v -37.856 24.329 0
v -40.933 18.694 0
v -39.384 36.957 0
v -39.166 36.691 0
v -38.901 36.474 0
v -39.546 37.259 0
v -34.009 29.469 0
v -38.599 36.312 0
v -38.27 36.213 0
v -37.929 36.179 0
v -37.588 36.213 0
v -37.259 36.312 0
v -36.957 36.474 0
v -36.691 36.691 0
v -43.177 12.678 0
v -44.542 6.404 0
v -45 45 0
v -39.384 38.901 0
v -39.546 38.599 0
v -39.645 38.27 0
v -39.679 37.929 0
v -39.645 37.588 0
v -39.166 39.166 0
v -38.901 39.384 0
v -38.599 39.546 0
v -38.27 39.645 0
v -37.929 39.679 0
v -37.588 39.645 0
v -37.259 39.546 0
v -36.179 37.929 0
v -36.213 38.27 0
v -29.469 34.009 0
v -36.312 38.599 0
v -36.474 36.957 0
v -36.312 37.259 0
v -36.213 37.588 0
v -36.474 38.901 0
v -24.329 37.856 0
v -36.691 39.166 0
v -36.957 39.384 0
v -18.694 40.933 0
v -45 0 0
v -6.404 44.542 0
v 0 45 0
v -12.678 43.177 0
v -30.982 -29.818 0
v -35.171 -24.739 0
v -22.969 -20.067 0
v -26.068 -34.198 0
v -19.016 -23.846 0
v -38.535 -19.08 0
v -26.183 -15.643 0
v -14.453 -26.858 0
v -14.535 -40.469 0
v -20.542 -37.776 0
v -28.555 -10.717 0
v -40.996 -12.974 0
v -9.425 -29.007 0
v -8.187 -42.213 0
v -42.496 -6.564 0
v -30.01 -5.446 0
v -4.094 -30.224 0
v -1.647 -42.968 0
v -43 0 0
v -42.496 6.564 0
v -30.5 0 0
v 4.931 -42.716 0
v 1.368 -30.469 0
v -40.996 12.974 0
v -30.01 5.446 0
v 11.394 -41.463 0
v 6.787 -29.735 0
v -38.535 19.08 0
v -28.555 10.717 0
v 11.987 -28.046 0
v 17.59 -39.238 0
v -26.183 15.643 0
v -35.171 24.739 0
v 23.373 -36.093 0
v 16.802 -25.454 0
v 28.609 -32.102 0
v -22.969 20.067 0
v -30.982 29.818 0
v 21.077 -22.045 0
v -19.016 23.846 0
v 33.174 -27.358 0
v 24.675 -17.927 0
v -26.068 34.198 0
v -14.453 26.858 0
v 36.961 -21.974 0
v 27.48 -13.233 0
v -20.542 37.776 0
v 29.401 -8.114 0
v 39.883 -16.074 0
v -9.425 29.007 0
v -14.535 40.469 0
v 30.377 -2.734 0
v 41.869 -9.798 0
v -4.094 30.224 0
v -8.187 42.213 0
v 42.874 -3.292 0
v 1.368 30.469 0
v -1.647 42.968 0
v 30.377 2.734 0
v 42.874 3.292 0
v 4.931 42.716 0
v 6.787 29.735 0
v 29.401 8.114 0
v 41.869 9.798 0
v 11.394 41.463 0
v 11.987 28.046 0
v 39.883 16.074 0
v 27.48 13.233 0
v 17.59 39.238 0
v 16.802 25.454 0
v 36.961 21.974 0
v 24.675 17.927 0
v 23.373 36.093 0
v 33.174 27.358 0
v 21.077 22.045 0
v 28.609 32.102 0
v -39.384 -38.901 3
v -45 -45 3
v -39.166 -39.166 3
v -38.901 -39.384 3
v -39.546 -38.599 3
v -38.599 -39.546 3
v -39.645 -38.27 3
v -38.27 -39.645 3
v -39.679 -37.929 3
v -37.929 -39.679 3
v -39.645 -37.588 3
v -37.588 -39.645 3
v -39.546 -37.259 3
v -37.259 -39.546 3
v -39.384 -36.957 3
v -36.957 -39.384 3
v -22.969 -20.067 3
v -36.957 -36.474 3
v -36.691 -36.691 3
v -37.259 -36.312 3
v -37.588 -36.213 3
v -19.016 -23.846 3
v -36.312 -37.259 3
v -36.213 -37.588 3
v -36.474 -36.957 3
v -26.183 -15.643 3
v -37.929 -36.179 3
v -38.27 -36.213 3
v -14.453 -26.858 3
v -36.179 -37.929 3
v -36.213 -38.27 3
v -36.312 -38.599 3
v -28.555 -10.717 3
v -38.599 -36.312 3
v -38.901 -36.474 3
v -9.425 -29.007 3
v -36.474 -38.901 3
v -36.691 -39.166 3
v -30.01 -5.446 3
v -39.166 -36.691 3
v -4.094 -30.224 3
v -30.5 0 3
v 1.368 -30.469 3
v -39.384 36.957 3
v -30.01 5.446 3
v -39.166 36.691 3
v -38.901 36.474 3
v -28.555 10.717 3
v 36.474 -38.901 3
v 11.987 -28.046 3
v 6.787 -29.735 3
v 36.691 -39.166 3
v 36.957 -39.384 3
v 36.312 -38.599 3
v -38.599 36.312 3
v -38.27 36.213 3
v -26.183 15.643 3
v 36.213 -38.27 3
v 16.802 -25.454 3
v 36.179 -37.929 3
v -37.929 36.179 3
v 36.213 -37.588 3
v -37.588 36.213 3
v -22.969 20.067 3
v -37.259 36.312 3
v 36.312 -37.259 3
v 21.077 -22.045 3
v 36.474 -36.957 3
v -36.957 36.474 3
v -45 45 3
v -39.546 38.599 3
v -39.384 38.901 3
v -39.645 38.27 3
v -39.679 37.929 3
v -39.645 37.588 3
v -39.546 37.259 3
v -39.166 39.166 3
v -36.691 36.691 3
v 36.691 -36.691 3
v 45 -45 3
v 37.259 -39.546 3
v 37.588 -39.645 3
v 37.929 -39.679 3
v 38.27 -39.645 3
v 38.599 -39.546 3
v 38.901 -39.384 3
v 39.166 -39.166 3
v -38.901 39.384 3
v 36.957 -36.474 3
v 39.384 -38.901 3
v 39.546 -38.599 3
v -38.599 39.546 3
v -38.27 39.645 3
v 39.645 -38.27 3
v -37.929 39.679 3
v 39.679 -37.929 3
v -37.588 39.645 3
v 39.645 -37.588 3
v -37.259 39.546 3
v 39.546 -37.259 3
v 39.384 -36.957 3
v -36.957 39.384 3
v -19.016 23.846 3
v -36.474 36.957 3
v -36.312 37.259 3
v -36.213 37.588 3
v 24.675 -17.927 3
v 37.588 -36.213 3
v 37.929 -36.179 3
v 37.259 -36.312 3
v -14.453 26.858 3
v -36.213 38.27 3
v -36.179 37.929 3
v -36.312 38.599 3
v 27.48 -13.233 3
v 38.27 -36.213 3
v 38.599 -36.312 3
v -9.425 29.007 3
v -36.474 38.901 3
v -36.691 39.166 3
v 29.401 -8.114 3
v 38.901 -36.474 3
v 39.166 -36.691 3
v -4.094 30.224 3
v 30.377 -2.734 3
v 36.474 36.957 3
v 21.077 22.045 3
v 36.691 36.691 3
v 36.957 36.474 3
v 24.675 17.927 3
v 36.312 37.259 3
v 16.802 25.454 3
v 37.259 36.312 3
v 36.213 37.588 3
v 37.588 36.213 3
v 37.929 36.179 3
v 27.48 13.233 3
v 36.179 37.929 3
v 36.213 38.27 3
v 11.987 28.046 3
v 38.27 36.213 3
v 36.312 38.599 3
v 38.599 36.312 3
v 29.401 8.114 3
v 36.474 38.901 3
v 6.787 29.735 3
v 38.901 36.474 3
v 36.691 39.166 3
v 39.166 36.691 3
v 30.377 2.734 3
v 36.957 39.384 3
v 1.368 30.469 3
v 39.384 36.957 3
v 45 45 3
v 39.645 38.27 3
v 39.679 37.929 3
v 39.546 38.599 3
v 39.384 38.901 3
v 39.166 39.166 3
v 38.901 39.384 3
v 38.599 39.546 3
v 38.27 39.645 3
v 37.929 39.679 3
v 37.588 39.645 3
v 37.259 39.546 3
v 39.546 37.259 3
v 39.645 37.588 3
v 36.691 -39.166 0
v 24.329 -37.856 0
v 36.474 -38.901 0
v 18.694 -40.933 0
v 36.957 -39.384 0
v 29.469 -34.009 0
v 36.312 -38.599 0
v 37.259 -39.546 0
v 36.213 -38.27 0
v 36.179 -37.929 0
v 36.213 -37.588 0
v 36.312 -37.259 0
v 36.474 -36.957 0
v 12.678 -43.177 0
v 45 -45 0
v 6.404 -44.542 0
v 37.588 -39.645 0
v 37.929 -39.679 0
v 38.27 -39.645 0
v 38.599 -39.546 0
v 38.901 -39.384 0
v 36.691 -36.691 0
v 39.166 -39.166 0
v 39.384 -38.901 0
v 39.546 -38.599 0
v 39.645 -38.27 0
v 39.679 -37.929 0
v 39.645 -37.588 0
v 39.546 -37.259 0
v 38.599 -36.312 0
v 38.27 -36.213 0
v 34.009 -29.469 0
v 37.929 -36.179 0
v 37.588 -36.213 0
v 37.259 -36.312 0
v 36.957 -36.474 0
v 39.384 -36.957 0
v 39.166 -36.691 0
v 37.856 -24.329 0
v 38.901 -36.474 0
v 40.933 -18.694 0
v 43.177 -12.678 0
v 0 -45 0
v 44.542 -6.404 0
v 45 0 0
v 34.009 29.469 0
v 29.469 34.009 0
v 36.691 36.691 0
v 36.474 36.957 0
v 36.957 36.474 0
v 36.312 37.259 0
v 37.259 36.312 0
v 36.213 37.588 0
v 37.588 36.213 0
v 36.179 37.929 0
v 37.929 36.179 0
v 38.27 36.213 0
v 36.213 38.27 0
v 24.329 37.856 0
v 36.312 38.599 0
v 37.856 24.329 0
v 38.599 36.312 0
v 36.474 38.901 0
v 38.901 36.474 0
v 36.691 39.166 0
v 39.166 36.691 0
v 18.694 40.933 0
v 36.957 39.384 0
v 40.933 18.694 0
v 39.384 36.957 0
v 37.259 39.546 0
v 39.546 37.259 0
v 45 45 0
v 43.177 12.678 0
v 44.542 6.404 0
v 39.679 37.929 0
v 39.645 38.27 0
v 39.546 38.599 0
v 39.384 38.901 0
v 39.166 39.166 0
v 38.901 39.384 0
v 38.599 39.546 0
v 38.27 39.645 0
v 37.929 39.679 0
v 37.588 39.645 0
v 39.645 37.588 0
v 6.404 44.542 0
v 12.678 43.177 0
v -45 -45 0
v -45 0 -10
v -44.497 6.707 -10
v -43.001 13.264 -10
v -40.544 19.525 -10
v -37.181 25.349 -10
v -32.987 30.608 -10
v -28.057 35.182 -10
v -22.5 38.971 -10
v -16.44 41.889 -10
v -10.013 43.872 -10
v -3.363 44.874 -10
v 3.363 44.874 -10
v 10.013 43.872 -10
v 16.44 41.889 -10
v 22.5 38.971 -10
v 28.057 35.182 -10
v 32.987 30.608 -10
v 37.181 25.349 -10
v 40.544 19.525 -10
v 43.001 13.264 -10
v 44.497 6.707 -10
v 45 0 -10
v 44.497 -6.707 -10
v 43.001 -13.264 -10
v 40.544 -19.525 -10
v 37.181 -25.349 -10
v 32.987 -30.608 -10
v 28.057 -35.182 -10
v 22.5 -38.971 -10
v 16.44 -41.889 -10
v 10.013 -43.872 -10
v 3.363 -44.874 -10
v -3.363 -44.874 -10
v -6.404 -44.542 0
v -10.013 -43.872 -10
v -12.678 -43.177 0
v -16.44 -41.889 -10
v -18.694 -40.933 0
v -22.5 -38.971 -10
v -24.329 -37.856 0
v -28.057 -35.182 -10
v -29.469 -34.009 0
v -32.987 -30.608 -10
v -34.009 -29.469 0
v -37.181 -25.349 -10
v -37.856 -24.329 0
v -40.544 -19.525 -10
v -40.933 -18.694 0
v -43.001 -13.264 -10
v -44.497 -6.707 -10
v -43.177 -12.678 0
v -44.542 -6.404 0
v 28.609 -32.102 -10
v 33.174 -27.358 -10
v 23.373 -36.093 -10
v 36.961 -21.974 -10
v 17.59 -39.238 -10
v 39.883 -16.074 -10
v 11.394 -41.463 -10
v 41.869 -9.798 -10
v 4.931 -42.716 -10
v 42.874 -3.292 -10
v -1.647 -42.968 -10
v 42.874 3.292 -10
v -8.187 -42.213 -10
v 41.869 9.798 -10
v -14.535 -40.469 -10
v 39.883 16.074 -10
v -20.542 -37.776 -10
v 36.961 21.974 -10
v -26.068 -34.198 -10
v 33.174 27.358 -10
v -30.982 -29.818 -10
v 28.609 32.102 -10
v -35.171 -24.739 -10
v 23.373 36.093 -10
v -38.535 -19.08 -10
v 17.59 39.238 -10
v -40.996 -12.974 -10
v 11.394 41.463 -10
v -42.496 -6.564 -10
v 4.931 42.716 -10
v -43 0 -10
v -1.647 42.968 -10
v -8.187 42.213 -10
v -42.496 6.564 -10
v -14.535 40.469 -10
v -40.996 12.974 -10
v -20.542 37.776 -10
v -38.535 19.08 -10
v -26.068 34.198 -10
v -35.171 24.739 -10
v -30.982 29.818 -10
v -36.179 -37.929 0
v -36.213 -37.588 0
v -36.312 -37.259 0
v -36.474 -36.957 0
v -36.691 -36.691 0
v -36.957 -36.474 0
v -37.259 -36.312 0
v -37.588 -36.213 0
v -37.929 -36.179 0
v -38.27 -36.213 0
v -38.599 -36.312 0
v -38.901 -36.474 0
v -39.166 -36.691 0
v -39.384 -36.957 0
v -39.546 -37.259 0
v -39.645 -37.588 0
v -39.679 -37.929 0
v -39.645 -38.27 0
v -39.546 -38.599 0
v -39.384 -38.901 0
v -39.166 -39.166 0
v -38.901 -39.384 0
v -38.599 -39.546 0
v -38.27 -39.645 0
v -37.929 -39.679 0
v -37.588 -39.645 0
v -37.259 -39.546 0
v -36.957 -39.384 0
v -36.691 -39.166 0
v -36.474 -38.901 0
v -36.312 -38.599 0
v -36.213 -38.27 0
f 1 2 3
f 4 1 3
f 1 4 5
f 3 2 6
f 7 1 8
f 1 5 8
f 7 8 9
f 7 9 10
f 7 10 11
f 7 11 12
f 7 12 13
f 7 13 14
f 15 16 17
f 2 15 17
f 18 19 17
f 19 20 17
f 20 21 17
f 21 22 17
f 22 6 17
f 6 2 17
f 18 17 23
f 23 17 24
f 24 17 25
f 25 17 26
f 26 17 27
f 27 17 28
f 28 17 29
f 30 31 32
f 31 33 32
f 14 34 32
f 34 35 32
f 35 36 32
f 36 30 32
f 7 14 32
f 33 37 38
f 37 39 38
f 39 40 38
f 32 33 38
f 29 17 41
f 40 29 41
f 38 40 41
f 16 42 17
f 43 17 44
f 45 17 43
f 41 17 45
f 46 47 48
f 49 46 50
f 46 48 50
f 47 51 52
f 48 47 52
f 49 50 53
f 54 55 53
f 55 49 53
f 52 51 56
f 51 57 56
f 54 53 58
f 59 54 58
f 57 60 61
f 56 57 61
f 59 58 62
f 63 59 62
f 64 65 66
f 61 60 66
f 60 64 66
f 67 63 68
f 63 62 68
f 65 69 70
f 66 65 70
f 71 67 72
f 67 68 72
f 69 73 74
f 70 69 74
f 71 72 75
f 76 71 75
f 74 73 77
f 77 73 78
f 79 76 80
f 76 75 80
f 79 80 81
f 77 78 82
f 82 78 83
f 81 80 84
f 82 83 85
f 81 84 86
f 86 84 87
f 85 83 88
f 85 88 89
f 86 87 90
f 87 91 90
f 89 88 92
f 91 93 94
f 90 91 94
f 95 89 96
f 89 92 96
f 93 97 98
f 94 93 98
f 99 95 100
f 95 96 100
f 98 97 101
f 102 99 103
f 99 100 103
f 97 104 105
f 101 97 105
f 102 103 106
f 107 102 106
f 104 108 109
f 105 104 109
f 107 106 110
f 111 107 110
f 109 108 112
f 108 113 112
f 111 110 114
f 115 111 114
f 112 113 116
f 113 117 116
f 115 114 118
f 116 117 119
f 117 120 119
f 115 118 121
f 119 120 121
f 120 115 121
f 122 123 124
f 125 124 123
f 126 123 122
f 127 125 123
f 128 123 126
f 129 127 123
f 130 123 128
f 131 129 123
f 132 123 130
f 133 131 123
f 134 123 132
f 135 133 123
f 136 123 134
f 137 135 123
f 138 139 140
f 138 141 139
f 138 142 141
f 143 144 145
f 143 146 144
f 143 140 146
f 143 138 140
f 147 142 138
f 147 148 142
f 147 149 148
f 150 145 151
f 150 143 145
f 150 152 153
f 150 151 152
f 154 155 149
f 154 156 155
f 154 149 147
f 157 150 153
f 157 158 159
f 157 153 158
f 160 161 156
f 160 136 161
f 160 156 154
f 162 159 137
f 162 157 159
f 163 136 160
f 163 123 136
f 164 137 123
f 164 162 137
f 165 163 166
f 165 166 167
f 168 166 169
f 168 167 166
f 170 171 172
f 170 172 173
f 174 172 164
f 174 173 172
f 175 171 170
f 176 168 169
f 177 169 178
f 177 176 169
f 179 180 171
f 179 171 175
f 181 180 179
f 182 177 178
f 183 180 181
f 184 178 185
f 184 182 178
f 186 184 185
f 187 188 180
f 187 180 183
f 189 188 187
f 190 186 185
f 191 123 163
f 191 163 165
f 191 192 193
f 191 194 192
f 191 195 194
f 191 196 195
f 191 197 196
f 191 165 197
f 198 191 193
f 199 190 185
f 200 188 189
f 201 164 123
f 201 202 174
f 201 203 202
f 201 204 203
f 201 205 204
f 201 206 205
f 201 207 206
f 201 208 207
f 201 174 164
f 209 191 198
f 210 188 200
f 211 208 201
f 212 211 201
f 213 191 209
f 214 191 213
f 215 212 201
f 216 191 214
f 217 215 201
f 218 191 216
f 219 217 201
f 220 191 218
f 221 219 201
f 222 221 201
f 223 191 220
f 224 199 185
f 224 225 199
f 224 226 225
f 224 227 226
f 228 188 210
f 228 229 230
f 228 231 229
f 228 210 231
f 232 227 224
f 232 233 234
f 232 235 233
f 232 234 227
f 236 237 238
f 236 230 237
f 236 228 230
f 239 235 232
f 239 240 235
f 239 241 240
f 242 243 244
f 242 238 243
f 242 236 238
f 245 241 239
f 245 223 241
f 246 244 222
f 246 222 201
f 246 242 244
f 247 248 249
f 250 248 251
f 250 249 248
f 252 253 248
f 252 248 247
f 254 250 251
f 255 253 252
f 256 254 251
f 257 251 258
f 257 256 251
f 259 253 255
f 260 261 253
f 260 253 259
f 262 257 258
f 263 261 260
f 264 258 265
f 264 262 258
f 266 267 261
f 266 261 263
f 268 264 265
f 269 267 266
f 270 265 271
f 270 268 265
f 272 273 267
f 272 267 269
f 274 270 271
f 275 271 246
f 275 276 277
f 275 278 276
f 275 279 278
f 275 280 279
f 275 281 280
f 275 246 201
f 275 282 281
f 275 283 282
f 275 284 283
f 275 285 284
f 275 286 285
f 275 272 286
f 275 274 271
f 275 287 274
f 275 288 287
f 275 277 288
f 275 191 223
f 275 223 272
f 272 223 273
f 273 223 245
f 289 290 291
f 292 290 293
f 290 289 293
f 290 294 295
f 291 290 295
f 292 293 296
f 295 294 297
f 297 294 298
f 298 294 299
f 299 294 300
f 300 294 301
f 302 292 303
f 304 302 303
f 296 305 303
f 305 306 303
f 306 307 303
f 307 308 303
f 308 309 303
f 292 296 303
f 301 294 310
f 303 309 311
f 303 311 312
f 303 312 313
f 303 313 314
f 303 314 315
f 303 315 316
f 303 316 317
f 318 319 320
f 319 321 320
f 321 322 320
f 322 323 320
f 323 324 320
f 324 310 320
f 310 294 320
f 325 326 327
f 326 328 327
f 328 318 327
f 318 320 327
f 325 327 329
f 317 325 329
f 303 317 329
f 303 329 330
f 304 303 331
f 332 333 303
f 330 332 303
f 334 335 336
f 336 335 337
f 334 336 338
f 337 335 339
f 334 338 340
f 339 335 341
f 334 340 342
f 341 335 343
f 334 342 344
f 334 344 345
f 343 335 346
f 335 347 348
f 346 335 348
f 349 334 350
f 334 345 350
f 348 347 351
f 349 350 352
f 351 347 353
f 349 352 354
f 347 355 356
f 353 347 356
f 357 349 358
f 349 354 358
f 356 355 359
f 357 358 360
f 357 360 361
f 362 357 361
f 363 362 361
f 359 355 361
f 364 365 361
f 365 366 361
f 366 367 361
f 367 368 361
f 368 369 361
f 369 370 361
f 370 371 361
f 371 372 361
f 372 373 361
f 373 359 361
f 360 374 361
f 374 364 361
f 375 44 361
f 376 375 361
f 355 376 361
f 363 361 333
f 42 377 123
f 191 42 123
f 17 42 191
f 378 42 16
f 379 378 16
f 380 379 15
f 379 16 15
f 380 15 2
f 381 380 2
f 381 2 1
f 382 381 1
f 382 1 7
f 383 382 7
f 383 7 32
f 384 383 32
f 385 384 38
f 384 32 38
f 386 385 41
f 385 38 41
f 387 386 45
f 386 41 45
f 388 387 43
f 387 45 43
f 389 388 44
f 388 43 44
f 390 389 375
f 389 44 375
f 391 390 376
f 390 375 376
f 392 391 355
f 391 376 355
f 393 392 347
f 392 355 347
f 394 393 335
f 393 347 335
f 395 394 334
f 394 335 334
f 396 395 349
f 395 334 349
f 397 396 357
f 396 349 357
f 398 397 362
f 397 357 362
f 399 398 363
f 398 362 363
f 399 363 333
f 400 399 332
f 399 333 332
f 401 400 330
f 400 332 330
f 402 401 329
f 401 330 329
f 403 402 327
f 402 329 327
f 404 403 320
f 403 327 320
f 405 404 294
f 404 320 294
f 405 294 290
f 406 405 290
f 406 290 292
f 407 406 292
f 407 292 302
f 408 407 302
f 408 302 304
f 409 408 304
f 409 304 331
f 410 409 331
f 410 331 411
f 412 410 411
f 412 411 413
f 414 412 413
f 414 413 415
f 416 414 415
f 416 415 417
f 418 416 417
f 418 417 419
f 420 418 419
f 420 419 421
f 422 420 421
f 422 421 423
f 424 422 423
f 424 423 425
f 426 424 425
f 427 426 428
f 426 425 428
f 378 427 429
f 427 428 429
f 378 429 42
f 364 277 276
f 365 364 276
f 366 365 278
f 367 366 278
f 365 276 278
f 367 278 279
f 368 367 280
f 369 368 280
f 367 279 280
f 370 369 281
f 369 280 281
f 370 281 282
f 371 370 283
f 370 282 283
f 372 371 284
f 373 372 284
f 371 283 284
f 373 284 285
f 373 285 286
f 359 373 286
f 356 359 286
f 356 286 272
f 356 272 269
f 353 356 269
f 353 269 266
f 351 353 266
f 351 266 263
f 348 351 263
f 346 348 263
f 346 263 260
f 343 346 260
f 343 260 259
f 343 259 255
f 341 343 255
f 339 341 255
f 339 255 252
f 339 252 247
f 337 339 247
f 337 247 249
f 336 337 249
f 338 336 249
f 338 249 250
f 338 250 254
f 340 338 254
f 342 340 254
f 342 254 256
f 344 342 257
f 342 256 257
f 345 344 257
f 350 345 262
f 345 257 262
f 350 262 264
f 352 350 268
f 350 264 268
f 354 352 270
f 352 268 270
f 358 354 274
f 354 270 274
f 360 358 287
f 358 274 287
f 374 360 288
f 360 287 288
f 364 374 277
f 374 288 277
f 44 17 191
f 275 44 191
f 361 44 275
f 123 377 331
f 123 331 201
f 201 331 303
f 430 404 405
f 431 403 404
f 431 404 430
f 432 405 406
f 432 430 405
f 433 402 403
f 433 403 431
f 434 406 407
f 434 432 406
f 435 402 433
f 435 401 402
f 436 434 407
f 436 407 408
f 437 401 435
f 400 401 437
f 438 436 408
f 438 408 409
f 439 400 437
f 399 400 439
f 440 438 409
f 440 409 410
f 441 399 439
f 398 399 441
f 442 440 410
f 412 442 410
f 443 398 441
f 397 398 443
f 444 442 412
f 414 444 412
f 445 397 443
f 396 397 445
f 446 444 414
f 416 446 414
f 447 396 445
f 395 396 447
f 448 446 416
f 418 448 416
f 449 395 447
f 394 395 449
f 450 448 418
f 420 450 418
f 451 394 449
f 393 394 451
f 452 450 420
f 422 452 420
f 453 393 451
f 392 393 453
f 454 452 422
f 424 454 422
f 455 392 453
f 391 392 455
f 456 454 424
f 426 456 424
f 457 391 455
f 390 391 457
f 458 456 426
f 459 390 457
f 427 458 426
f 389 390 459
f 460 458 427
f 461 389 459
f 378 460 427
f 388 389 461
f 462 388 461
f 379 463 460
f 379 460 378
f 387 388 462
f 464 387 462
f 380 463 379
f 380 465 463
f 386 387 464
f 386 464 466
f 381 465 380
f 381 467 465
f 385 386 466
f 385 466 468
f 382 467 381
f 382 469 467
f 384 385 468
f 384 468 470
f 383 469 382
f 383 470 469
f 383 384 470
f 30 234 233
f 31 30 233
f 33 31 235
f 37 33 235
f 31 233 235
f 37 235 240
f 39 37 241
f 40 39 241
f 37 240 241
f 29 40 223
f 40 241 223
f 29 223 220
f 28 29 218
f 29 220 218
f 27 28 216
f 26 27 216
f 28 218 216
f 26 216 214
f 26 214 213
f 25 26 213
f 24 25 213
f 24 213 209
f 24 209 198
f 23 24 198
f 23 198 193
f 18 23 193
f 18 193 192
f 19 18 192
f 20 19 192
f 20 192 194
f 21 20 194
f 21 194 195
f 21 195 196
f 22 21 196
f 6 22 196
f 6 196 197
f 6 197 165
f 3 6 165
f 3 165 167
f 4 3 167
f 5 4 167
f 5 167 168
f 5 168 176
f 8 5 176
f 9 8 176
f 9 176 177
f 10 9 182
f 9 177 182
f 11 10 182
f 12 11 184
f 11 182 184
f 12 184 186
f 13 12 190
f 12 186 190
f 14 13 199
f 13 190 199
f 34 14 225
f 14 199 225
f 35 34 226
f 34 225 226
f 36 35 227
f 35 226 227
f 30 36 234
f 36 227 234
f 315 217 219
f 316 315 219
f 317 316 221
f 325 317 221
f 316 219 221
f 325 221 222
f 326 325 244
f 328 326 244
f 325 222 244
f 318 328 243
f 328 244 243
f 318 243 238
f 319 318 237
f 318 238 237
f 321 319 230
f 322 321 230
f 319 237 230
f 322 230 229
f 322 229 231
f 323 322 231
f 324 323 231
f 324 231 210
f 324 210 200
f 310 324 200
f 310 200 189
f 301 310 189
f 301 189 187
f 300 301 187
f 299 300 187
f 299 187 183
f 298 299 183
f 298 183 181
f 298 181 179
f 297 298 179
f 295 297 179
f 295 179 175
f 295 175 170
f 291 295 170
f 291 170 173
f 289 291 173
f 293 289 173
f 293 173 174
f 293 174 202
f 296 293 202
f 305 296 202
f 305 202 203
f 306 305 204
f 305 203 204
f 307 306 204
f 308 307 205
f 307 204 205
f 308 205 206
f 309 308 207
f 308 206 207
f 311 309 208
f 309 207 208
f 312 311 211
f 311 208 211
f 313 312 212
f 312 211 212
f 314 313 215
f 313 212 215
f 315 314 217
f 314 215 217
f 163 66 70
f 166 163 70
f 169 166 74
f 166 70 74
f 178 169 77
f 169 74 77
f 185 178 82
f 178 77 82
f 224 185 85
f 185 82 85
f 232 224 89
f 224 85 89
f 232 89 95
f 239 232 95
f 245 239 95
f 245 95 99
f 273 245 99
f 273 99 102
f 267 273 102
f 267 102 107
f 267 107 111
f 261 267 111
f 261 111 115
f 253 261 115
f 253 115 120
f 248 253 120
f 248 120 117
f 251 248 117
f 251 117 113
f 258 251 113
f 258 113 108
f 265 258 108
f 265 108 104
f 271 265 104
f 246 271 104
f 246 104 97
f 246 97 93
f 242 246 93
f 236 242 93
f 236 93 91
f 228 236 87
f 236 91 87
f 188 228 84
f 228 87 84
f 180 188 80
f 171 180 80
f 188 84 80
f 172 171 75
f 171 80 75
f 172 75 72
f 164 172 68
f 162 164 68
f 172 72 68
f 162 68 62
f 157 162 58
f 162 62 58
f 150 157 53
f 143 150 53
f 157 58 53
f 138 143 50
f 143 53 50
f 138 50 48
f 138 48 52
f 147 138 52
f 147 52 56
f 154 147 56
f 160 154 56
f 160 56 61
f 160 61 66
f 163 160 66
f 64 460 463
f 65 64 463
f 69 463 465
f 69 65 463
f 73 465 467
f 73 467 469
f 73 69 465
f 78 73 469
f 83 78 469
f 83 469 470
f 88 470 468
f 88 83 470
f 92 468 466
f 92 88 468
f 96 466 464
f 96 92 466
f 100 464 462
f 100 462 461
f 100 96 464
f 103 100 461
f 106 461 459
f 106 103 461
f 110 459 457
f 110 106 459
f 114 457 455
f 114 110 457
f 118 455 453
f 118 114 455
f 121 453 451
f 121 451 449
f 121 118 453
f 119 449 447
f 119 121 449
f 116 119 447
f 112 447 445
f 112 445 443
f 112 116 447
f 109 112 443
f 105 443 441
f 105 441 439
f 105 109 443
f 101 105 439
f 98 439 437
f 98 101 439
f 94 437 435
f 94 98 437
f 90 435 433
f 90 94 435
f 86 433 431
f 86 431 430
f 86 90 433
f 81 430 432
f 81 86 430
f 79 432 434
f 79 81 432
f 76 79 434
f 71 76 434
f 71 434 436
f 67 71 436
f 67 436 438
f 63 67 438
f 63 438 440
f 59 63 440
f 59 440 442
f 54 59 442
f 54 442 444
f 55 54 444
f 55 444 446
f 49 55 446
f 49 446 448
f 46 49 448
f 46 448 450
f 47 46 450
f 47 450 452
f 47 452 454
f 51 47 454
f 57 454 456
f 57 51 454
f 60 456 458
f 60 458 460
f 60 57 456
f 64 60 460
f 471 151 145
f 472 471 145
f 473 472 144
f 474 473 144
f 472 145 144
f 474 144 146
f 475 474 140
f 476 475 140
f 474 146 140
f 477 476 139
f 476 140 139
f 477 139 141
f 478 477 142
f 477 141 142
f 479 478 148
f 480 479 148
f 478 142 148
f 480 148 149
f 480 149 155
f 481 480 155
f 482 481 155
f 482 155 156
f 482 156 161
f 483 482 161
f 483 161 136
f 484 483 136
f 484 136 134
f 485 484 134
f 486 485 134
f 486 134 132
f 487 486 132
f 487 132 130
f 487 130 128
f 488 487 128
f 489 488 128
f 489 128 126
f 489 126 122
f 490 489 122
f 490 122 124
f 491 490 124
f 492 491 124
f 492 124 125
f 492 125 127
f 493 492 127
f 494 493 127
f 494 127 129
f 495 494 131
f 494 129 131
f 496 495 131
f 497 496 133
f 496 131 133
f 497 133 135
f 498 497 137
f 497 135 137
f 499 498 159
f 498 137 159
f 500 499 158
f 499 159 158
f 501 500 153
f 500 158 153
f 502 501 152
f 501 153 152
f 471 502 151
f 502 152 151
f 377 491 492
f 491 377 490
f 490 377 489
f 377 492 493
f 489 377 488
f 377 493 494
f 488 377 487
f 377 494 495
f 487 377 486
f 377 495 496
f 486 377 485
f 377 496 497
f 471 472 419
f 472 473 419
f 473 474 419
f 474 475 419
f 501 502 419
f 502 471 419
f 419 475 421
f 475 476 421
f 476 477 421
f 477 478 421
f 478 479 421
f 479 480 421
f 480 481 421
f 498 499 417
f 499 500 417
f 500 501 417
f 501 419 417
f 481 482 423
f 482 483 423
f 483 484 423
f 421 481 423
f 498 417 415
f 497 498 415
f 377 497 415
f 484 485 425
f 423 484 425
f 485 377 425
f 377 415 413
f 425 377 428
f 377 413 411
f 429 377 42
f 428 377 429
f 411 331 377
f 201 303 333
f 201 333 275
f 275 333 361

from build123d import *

# Parameters (mm, degrees)
SKETCH1_W           = 90
SKETCH1_H           = 90
BOSS_EXTRUDE1_DEPTH = 3
SKETCH9_R           = 45
SKETCH9_R_2         = 43
BOSS_EXTRUDE4_DEPTH = 10
SKETCH11_R          = 30.5
CUT_EXTRUDE9_DEPTH  = 58
SKETCH14_R          = 1.75
CUT_EXTRUDE10_DEPTH = 58


with BuildPart() as part:
    # Sketch1 → Boss-Extrude1 (new body)
    with BuildSketch(Plane.XY):
        Rectangle(SKETCH1_W, SKETCH1_H)
    extrude(amount=BOSS_EXTRUDE1_DEPTH)

    # Sketch9 → Boss-Extrude4 (add)
    with BuildSketch(Plane(origin=(0, 0, 0), x_dir=(-1, 0, 0), z_dir=(0, 0, -1))):
        Circle(SKETCH9_R)
        Circle(SKETCH9_R_2, mode=Mode.SUBTRACT)
    extrude(amount=BOSS_EXTRUDE4_DEPTH)

    # Sketch11 → Cut-Extrude9 (cut)
    with BuildSketch(Plane(origin=(0, 0, 0), x_dir=(-1, 0, 0), z_dir=(0, 0, -1))):
        Circle(SKETCH11_R)
    extrude(amount=-CUT_EXTRUDE9_DEPTH, mode=Mode.SUBTRACT)

    # Sketch14 → Cut-Extrude10 (cut)
    with BuildSketch(Plane.XY.offset(3)):
        with Locations((-37.928932188, 37.928932188)):
            Circle(SKETCH14_R)
        with Locations((37.928932188, 37.928932188)):
            Circle(SKETCH14_R)
        with Locations((37.928932188, -37.928932188)):
            Circle(SKETCH14_R)
        with Locations((-37.928932188, -37.928932188)):
            Circle(SKETCH14_R)
    extrude(amount=-CUT_EXTRUDE10_DEPTH, mode=Mode.SUBTRACT)


solid = part.part
